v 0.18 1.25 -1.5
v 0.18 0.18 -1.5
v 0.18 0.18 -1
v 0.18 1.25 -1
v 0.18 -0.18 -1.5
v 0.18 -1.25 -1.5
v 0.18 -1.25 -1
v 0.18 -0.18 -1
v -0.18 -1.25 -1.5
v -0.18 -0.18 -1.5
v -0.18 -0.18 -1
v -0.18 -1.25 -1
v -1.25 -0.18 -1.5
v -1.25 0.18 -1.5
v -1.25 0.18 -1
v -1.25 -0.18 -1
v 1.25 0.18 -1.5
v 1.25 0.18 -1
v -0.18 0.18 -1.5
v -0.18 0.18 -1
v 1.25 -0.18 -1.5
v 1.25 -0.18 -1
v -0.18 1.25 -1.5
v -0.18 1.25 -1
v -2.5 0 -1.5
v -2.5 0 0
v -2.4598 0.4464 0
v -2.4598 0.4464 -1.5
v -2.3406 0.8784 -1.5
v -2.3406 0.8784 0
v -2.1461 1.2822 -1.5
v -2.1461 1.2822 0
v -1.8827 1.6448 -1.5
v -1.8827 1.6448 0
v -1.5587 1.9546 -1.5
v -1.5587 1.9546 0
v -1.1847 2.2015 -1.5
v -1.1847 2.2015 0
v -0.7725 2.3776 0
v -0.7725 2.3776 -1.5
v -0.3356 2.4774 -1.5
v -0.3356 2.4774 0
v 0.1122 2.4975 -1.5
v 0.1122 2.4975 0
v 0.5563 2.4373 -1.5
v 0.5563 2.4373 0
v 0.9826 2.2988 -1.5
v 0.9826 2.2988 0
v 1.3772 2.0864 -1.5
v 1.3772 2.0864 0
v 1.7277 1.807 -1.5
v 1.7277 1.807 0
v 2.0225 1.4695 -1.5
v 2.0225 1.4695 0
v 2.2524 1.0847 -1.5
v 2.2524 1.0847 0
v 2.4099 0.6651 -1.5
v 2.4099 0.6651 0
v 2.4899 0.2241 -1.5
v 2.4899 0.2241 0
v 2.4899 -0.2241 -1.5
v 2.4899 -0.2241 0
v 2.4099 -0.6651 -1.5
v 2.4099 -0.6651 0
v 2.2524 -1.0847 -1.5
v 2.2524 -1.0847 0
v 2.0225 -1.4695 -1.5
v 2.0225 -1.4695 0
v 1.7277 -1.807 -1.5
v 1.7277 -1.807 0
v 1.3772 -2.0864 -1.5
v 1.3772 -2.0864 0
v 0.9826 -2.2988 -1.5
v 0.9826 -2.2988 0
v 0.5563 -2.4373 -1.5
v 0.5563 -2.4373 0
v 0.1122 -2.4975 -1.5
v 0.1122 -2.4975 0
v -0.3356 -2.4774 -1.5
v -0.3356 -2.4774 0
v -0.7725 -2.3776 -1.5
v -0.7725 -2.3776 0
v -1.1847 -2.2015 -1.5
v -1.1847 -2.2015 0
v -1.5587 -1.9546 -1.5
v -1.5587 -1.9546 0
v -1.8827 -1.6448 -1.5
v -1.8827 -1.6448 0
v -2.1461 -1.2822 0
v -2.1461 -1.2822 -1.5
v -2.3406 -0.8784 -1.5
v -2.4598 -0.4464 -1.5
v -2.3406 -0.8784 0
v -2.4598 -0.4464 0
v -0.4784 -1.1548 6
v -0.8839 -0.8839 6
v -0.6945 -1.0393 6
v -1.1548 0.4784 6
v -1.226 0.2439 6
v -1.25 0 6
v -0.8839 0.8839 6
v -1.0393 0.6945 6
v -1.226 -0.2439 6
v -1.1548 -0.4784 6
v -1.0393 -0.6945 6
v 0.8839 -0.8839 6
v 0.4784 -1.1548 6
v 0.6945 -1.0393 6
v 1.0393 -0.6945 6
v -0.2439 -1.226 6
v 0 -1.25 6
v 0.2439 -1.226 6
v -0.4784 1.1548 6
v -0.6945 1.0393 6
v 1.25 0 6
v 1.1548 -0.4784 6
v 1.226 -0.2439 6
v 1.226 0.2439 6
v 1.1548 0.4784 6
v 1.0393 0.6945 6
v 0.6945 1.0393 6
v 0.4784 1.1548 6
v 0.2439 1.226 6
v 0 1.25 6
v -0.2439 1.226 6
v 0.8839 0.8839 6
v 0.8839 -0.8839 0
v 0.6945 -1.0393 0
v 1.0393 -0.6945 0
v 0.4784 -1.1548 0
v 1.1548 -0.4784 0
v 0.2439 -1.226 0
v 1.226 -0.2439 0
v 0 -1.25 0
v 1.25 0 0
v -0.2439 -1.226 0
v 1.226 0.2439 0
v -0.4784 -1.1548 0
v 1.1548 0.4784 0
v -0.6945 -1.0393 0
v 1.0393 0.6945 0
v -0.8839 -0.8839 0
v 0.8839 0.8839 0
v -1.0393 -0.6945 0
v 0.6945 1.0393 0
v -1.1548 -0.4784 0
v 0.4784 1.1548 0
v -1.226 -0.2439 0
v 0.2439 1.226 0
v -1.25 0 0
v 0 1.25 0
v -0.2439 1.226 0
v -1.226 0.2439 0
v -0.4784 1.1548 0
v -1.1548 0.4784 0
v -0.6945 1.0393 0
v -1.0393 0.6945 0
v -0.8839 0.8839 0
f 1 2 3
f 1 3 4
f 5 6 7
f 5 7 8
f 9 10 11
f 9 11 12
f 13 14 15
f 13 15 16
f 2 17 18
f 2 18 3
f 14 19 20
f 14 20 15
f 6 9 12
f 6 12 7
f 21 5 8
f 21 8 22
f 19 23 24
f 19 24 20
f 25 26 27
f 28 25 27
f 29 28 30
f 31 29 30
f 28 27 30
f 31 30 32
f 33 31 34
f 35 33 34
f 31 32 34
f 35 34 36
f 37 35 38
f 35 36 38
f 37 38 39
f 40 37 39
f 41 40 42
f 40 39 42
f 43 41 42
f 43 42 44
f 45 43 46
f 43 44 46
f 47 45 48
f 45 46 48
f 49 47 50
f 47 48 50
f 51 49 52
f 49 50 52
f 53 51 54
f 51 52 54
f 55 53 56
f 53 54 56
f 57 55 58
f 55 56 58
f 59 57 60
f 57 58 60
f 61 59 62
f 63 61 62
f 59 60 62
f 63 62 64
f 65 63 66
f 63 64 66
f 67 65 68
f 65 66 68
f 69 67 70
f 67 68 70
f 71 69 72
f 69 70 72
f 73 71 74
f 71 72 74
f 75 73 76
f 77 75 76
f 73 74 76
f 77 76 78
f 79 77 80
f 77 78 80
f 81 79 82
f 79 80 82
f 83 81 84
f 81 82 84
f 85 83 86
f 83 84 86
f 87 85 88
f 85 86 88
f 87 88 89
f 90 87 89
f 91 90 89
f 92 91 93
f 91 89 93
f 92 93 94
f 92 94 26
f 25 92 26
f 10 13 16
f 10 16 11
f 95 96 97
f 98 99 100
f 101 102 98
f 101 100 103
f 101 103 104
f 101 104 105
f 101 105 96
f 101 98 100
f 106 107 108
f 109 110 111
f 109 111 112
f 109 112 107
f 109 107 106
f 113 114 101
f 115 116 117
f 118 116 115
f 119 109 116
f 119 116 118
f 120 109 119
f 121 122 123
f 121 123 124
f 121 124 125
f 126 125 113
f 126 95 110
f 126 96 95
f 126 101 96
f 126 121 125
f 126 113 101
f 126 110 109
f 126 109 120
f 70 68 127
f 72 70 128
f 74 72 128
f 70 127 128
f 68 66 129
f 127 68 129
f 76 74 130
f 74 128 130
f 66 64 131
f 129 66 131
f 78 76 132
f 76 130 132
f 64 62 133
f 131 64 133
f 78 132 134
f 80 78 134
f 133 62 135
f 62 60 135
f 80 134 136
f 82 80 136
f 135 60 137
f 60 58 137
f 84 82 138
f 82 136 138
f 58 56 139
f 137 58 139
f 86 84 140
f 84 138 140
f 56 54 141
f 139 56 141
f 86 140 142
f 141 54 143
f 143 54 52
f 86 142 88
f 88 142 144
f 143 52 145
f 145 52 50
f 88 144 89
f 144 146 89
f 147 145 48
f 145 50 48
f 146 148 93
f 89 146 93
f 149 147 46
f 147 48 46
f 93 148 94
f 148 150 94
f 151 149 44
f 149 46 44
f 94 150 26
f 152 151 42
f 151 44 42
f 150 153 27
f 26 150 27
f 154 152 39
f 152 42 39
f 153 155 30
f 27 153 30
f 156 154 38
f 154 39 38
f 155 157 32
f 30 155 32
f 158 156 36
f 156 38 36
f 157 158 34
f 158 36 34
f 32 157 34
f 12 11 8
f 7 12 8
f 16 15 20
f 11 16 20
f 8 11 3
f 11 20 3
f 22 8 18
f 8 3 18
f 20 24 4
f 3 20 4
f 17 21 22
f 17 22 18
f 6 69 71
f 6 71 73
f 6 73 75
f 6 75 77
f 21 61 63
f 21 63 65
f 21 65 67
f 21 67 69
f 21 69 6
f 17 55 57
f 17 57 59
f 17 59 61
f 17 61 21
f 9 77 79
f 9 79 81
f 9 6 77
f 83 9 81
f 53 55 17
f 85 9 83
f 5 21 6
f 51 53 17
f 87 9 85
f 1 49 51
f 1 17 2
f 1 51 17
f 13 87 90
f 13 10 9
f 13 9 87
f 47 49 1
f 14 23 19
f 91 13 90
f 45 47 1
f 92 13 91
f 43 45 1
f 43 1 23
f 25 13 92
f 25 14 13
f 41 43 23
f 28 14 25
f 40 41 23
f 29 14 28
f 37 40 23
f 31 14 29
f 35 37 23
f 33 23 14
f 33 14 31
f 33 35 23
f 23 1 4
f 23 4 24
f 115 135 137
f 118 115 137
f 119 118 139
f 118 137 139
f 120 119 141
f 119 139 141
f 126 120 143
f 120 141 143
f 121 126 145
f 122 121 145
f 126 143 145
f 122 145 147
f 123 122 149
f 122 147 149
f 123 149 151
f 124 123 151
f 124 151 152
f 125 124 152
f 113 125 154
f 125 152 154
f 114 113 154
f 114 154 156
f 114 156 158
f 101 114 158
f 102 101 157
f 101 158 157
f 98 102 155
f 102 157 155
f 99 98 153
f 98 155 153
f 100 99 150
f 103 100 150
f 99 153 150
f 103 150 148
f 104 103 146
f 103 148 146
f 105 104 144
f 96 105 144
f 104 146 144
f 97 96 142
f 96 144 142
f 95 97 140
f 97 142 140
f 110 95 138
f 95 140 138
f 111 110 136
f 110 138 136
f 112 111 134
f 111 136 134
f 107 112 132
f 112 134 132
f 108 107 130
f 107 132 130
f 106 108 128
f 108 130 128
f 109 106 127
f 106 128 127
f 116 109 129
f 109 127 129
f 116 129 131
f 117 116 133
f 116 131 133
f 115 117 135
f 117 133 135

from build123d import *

# Parameters (mm, degrees)
SKETCH_1_R          = 1.25
EXTRUDE_1_DEPTH     = 6
SKETCH_2_R          = 2.5
EXTRUDE_2_DEPTH     = 1.5
CUT_EXTRUDE_1_DEPTH = 0.5


with BuildPart() as part:
    # 草图1 → 凸台-拉伸1 (new body)
    with BuildSketch(Plane.XY):
        Circle(SKETCH_1_R)
    extrude(amount=EXTRUDE_1_DEPTH)

    # 草图2 → 凸台-拉伸2 (add)
    with BuildSketch(Plane(origin=(0, 0, 0), x_dir=(-1, 0, 0), z_dir=(0, 0, -1))):
        Circle(SKETCH_2_R)
    extrude(amount=EXTRUDE_2_DEPTH)

    # 草图3 → 切除-拉伸1 (cut)
    with BuildSketch(Plane(origin=(0, 0, -1.5), x_dir=(-1, 0, 0), z_dir=(0, 0, -1))):
        Polygon((0.18, 1.25), (0.18, 0.18), (1.25, 0.18), (1.25, -0.18), (0.18, -0.18), (0.18, -1.25), (-0.18, -1.25), (-0.18, -0.18), (-1.25, -0.18), (-1.25, 0.18), (-0.18, 0.18), (-0.18, 1.25), align=None)
    extrude(amount=-CUT_EXTRUDE_1_DEPTH, mode=Mode.SUBTRACT)


solid = part.part
